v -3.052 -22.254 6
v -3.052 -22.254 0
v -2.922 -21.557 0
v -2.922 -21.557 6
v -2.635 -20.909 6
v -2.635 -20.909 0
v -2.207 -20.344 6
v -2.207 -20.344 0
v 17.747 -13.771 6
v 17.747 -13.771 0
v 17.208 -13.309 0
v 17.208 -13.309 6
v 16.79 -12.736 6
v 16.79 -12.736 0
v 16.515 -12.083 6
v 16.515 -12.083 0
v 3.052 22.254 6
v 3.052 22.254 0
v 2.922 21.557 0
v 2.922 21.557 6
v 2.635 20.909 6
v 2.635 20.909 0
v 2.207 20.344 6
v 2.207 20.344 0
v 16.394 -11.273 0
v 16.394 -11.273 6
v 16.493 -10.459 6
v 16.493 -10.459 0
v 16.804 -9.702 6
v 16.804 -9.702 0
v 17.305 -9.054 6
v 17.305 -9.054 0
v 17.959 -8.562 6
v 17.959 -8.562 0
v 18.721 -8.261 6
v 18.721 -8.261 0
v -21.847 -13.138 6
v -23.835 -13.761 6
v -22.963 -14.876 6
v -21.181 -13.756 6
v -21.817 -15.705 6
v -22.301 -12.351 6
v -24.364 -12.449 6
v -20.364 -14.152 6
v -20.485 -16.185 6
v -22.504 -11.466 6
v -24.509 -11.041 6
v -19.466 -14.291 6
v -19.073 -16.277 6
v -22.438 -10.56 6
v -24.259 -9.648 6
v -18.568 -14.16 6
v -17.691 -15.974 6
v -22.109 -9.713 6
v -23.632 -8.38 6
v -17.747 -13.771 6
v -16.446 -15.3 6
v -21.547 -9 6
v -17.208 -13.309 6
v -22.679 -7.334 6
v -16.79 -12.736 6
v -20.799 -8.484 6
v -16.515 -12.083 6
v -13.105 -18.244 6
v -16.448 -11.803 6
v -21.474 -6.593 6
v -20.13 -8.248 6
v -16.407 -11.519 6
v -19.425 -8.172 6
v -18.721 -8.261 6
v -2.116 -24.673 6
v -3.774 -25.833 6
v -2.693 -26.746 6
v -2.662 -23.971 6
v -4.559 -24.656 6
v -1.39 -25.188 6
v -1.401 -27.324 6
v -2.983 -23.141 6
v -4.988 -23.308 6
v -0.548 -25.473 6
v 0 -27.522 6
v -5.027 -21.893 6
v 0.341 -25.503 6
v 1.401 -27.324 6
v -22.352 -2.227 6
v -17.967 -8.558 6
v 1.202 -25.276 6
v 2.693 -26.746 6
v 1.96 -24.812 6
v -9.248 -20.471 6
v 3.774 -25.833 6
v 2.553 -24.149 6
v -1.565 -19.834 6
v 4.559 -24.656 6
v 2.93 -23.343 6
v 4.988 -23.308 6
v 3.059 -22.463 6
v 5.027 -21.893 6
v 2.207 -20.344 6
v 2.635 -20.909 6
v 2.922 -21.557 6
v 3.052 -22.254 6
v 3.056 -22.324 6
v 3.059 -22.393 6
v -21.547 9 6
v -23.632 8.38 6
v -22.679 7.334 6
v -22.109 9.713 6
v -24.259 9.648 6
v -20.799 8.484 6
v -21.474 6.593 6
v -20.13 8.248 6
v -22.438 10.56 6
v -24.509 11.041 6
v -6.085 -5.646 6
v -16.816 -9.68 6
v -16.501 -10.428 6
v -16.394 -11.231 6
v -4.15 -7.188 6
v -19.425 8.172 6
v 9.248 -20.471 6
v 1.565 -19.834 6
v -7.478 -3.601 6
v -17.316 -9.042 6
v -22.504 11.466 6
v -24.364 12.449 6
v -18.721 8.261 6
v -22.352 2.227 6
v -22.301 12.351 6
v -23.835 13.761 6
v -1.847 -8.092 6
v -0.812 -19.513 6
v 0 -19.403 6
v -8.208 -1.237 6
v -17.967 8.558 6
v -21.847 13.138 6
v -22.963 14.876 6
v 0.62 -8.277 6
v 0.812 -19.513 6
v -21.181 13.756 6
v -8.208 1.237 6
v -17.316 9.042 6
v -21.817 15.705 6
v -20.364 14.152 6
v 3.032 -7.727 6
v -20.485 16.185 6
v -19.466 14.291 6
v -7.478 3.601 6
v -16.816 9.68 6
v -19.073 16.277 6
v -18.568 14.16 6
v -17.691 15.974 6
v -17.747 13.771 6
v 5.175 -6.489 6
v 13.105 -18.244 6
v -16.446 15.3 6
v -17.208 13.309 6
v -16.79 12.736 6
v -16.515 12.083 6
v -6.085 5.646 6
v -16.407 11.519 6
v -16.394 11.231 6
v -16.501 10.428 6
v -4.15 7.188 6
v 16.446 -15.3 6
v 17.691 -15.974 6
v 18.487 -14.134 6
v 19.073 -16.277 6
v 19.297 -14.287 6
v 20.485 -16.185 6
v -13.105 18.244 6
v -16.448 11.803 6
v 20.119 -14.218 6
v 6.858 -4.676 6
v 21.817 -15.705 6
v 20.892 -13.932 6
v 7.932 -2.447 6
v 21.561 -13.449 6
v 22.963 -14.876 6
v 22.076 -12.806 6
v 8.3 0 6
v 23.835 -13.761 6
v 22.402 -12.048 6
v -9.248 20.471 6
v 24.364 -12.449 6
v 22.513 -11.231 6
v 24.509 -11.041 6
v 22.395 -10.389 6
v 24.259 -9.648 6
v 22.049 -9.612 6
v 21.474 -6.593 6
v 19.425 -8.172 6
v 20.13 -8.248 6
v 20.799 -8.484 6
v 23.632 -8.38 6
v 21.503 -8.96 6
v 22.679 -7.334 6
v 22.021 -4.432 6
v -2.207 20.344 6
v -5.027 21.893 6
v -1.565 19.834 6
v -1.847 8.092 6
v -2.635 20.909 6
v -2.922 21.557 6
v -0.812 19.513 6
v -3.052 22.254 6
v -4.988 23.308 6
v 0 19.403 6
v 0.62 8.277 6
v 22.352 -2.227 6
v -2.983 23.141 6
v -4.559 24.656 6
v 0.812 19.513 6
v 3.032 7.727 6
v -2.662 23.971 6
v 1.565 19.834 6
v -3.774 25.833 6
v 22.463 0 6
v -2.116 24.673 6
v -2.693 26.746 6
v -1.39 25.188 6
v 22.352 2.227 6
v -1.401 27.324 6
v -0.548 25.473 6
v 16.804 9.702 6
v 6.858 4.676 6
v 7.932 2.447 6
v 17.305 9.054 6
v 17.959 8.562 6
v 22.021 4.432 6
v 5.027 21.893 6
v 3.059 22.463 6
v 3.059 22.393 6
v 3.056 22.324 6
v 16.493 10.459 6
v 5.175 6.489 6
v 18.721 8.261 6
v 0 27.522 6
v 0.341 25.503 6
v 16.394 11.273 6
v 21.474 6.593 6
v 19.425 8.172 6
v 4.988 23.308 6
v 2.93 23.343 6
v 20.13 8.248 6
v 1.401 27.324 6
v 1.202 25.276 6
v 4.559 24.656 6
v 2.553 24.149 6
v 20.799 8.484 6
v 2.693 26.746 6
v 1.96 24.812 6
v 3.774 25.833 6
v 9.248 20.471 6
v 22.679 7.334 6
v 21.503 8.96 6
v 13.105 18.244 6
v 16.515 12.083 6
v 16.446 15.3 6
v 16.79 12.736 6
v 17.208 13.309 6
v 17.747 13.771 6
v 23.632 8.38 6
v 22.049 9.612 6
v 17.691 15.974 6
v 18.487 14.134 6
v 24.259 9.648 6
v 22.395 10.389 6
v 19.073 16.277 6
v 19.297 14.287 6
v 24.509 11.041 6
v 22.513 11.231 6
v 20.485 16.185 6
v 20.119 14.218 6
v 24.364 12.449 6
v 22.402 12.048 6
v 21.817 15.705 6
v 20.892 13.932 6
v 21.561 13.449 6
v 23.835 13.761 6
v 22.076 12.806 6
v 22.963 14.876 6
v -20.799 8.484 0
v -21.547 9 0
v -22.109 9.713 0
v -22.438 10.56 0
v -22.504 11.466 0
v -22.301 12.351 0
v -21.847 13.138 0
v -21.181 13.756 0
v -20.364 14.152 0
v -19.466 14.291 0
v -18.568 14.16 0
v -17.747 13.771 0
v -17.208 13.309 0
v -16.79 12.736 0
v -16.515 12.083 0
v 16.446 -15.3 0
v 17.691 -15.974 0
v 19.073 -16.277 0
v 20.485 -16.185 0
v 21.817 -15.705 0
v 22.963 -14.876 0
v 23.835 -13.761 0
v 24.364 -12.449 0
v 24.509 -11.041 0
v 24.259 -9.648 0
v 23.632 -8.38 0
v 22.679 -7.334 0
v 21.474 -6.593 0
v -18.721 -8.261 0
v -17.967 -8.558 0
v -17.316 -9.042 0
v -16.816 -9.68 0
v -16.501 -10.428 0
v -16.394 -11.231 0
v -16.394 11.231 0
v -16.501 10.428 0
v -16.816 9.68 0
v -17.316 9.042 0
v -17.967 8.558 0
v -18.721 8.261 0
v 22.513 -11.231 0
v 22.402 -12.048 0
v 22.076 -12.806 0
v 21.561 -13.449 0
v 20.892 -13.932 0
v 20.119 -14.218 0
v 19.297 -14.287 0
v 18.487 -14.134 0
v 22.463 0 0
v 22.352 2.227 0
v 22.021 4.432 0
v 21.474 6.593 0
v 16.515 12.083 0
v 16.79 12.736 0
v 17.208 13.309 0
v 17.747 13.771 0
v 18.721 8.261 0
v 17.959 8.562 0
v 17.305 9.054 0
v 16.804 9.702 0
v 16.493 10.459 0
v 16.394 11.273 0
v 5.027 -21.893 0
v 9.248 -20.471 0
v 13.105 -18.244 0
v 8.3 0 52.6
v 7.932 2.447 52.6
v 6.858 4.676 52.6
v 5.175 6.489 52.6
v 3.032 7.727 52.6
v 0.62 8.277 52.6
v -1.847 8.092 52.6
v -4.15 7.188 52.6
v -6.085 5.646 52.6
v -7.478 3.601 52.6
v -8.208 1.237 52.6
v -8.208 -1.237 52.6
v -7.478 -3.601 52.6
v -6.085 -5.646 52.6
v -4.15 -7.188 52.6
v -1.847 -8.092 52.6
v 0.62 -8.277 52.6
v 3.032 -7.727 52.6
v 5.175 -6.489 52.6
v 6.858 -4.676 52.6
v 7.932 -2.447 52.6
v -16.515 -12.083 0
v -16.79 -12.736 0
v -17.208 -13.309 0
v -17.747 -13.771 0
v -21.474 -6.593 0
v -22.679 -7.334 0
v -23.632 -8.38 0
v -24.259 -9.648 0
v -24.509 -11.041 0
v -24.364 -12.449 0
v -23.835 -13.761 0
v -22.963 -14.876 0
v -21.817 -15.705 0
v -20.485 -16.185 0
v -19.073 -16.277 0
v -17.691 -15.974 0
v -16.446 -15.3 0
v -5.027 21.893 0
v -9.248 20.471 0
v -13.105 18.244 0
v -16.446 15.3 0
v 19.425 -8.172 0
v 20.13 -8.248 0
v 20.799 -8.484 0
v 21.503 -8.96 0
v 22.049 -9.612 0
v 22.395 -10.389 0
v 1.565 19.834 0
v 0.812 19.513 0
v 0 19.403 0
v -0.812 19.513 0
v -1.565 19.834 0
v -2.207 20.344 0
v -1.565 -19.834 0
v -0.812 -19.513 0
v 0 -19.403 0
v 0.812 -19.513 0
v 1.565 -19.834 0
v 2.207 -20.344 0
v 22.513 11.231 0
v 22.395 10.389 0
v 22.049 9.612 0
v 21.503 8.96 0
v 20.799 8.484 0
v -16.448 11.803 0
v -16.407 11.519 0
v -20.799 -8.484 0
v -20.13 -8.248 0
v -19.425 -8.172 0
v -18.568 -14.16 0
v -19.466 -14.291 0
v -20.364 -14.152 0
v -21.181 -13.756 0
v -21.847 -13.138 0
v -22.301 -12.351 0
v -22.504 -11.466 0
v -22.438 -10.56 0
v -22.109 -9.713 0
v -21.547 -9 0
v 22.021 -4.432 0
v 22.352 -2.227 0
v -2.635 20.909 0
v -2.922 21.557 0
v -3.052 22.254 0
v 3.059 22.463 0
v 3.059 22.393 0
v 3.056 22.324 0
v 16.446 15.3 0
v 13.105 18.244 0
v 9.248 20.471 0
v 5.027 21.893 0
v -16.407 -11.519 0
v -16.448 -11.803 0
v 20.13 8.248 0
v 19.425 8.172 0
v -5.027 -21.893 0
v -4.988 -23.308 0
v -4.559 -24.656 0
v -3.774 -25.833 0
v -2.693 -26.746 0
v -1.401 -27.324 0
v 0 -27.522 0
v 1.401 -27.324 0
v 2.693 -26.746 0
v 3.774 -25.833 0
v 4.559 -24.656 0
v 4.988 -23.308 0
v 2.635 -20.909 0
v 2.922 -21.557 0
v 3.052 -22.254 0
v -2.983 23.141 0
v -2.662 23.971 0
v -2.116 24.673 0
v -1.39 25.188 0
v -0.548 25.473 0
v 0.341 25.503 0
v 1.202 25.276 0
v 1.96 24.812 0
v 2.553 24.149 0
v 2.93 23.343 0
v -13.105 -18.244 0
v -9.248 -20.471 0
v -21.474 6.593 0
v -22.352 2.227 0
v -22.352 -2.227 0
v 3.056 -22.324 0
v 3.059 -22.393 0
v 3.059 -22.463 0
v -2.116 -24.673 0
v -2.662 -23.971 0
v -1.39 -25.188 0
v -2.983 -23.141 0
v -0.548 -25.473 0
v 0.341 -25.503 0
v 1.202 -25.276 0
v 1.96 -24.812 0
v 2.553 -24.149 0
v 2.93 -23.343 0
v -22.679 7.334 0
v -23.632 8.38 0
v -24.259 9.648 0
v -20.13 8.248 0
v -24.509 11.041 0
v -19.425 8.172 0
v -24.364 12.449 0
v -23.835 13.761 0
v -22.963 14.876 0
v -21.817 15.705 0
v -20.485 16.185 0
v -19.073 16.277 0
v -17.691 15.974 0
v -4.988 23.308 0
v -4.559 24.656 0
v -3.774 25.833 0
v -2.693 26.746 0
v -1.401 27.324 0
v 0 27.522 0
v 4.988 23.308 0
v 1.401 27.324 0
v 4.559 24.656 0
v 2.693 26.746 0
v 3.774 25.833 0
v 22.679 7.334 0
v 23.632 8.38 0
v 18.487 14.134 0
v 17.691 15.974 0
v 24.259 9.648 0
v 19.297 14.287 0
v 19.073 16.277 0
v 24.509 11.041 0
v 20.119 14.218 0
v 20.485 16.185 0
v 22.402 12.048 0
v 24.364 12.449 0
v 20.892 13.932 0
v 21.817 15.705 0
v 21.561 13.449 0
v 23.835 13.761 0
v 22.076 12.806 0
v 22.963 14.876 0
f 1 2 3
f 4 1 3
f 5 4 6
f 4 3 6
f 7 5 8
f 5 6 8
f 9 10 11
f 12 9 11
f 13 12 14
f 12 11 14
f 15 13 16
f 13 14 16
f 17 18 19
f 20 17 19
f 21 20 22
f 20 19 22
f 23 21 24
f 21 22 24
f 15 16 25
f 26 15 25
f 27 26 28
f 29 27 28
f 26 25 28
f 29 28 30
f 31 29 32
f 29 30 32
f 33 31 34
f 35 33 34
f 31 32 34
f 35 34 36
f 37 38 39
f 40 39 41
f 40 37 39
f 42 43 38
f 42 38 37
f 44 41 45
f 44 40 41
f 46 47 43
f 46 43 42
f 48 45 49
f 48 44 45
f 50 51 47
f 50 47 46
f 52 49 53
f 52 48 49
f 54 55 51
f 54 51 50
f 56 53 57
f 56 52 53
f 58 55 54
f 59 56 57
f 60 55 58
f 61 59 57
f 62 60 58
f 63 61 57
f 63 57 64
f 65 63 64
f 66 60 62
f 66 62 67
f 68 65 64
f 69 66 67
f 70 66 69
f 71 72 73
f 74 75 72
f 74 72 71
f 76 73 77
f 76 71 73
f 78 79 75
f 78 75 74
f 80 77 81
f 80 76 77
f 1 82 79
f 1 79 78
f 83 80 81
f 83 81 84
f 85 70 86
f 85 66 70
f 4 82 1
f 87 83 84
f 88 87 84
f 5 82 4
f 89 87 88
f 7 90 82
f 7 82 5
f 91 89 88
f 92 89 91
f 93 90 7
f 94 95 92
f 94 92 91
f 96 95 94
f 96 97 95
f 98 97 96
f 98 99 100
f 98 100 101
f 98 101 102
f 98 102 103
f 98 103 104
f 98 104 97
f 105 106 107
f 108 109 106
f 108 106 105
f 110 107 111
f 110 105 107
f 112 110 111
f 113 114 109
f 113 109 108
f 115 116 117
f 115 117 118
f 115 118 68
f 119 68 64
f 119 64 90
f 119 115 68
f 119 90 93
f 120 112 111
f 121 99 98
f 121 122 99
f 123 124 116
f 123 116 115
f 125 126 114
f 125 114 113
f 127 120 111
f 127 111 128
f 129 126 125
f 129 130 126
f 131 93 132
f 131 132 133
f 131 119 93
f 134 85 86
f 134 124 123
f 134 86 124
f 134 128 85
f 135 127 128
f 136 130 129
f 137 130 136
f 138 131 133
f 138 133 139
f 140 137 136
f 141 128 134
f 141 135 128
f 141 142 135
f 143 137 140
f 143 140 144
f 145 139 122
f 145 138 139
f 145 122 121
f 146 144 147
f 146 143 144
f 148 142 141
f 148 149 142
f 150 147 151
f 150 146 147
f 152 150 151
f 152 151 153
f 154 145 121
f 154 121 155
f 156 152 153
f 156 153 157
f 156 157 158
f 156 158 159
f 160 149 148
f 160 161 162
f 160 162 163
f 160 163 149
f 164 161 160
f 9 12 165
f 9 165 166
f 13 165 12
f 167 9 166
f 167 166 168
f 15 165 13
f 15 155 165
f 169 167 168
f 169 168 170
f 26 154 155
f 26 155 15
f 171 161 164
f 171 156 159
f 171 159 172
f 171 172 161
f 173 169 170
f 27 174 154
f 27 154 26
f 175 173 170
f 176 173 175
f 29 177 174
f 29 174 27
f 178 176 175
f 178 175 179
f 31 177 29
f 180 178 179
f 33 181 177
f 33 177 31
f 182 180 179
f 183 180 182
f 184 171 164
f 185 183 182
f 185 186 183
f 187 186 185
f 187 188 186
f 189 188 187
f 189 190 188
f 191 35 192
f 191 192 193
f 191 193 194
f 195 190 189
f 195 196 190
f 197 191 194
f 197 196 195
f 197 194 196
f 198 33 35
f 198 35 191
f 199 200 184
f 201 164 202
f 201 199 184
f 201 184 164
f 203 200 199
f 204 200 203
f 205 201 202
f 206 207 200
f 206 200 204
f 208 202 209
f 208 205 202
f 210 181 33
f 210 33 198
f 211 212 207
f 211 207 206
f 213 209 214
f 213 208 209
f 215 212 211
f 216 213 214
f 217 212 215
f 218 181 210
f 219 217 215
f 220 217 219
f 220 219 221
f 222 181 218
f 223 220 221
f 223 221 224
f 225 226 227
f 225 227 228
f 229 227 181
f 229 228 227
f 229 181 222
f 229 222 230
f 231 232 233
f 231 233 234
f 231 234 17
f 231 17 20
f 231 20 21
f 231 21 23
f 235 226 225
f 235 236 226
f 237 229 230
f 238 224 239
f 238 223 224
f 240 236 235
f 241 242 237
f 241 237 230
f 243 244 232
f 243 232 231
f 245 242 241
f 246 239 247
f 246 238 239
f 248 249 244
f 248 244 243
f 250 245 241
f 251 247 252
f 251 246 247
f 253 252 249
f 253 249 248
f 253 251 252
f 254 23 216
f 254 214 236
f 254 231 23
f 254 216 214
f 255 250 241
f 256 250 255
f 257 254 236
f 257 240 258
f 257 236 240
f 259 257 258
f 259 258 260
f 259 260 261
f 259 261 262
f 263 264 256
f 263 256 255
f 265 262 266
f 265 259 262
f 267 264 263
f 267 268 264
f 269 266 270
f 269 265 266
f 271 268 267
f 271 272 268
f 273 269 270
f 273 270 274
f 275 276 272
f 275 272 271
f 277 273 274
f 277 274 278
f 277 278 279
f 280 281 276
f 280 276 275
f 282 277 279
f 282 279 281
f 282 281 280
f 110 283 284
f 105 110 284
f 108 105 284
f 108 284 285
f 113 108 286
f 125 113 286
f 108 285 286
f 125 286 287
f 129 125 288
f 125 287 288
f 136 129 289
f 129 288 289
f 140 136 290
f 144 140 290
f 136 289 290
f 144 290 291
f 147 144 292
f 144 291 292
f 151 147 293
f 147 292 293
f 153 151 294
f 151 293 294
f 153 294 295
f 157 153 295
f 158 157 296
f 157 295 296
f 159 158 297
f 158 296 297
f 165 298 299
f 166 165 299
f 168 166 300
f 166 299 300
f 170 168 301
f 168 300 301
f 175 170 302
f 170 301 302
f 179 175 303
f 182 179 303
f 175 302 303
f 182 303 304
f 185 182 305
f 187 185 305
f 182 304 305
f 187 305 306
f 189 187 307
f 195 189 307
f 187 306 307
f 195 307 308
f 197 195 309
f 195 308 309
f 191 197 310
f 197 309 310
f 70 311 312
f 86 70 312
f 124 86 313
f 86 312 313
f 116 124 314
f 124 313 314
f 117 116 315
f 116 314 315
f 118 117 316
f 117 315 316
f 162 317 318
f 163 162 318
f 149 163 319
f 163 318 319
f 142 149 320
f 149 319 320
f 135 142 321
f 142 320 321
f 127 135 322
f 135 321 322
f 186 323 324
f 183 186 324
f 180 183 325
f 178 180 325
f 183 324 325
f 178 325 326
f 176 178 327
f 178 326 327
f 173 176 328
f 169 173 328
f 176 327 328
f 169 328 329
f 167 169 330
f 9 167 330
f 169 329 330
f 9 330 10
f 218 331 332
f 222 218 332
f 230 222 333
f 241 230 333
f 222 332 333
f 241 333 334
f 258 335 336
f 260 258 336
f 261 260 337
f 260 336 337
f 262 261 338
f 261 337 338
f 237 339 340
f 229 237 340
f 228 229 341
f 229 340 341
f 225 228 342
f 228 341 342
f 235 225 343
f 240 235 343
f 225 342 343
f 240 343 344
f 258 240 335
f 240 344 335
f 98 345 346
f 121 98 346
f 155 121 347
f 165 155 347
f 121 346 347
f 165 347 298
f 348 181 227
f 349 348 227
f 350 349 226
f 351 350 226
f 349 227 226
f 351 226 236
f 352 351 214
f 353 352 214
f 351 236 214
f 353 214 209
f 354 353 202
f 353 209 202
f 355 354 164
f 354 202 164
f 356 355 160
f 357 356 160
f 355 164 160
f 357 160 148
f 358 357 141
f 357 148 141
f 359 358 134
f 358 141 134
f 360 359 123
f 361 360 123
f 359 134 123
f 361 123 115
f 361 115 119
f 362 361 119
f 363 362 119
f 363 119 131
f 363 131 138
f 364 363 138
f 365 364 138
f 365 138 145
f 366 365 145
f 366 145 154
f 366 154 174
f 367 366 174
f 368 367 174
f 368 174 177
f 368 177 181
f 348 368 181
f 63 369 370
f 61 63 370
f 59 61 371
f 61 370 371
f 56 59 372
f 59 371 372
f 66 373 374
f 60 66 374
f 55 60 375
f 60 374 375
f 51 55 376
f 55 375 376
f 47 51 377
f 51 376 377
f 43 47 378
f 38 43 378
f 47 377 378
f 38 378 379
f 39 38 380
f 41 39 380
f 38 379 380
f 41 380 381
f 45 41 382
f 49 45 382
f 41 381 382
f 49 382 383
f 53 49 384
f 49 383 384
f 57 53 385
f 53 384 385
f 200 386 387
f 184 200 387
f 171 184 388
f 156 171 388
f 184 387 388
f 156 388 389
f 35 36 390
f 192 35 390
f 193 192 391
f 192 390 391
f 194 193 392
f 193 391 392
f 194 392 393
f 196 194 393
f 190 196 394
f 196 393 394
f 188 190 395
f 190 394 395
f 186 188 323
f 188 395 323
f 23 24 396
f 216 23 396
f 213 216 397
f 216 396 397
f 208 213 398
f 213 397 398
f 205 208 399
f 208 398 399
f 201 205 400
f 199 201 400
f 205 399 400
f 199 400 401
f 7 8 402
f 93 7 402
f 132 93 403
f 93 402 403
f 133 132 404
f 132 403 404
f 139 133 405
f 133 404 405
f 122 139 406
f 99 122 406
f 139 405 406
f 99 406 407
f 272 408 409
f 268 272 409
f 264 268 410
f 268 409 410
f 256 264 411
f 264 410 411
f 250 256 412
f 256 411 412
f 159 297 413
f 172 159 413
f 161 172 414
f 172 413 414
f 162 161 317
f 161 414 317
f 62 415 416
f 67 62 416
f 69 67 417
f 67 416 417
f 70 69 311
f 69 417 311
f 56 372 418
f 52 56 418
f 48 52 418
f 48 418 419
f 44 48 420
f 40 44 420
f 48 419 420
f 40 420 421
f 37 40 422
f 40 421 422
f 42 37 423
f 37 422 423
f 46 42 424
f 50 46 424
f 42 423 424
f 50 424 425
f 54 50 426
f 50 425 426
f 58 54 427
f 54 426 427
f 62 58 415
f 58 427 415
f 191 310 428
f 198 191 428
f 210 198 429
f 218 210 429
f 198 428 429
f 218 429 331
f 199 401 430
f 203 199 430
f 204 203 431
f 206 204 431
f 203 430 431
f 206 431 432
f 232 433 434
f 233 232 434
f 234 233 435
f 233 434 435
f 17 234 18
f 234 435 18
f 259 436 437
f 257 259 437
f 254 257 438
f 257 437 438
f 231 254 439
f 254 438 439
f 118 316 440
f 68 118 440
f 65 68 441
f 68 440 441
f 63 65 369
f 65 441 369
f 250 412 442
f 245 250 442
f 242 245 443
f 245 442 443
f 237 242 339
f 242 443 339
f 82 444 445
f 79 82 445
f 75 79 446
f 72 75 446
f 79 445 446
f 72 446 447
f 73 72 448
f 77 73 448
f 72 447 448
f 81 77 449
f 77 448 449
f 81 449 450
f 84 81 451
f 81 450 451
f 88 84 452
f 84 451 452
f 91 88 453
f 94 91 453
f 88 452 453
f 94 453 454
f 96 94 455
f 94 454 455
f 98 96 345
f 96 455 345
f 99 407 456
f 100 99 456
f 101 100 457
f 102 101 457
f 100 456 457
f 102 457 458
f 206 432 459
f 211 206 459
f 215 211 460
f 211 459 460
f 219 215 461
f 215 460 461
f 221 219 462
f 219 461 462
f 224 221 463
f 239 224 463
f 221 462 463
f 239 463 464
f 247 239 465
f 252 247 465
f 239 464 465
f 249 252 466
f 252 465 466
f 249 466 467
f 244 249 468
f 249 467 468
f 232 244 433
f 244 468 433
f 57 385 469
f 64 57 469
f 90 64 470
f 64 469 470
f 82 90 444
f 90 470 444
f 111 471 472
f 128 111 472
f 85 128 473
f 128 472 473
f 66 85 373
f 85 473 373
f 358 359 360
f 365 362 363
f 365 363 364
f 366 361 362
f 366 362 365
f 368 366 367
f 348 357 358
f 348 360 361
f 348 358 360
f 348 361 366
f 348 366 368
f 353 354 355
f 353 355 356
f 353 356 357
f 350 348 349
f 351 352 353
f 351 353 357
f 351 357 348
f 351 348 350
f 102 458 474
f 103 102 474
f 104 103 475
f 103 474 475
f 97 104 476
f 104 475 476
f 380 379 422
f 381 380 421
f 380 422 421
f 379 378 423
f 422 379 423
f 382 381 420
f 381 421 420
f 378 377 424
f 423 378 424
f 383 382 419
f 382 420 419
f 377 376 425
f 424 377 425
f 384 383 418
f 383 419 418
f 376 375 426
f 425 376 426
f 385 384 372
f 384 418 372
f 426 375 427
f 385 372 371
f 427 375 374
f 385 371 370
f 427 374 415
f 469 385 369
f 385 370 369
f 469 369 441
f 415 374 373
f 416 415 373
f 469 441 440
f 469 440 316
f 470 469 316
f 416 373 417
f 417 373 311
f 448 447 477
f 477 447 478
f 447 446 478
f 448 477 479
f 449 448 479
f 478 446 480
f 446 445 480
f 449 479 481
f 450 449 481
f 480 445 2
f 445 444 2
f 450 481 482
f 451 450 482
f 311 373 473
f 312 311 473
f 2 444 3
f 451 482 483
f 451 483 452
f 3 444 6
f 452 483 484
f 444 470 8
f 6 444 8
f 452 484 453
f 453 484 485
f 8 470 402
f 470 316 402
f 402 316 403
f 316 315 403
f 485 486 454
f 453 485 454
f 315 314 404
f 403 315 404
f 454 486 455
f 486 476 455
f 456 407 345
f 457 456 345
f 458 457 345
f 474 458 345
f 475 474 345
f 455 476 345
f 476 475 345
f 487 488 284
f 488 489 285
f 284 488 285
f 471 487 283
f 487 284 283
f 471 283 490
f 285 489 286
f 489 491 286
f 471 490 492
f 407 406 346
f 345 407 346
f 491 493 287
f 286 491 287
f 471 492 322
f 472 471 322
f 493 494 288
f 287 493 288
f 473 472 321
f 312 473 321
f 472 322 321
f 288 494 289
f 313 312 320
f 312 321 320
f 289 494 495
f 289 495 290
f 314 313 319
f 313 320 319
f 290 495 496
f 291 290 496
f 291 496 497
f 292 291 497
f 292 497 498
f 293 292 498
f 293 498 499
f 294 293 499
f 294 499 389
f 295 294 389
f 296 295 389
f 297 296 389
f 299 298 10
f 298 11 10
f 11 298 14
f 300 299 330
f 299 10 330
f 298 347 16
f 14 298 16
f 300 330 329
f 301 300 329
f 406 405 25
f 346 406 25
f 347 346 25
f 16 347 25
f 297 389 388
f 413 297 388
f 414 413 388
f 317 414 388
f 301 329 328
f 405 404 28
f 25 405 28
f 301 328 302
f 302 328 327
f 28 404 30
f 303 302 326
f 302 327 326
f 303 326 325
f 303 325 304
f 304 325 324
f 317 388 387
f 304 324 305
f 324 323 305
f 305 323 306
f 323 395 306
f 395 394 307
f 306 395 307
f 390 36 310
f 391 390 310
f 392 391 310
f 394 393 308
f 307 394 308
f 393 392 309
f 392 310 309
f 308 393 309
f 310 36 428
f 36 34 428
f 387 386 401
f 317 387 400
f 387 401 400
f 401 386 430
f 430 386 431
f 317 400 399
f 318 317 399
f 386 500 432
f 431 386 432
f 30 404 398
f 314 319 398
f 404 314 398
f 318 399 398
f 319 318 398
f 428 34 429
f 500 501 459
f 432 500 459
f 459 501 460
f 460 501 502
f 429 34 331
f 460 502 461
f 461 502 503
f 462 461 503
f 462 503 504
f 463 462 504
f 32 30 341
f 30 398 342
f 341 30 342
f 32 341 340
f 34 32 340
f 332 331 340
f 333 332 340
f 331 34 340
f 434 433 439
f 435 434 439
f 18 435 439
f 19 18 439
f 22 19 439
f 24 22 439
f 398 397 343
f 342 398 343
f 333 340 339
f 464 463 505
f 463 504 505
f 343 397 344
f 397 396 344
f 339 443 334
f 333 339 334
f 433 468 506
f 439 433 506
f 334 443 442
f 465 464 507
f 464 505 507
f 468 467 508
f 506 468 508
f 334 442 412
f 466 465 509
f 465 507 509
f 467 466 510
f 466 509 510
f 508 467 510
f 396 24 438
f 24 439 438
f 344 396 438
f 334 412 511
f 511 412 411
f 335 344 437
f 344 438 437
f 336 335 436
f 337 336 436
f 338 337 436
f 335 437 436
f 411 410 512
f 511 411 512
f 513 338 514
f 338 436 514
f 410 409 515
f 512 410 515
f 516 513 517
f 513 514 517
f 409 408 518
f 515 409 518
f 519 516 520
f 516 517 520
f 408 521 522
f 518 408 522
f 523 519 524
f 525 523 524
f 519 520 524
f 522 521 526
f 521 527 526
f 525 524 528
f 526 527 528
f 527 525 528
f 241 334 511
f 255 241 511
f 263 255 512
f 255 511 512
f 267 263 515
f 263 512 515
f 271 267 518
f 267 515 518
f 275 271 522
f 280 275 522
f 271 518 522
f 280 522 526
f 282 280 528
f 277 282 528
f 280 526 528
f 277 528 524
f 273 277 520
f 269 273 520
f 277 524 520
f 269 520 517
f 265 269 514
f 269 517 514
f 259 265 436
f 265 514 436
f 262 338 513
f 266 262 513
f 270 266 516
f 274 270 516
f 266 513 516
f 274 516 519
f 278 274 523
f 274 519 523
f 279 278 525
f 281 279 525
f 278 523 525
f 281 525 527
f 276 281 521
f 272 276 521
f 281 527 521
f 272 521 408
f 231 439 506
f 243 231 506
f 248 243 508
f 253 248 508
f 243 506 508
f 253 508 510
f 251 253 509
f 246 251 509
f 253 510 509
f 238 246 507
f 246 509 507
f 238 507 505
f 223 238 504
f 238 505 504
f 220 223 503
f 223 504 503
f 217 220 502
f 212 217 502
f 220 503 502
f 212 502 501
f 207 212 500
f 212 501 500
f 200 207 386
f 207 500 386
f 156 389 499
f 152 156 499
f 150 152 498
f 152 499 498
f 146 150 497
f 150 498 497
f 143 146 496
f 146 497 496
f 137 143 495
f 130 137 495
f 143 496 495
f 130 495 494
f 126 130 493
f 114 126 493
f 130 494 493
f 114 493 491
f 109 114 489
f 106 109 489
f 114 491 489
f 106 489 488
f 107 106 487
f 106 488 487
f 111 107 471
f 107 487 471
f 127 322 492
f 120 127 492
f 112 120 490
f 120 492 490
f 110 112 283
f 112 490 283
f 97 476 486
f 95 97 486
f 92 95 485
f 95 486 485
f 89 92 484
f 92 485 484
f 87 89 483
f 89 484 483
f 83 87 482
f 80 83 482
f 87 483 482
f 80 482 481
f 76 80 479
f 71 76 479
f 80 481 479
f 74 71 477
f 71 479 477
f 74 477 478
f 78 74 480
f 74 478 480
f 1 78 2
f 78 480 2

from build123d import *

# Parameters (mm, degrees)
F0_R     = 8.300329
F1_DEPTH = 52.6
F2_DEPTH = 6


with BuildPart() as f1:
    # F0 (on Top) → F1 (new body)
    with BuildSketch(Plane.XY):
        Circle(F0_R)
    extrude(amount=F1_DEPTH)

    # F0 (on Top) → F2 (join)
    with BuildSketch(Plane.XY):
        with BuildLine():
            ThreePointArc((17.74679, 13.770643), (17.113653, 14.549985), (16.44632, 15.300253))
            ThreePointArc((16.44632, 15.300253), (11.23142, 19.45339), (5.027248, 21.893057))
            ThreePointArc((5.027248, 21.893057), (4.04383, 22.095851), (3.052332, 22.254493))
            ThreePointArc((3.052332, 22.254493), (2.797639, 21.224553), (2.206503, 20.343529))
            ThreePointArc((2.206503, 20.343529), (10.23142, 17.721339), (16.514761, 12.082652))
            ThreePointArc((16.514761, 12.082652), (16.982183, 13.035103), (17.74679, 13.770643))
        make_face()
        with BuildLine():
            ThreePointArc((3.052332, 22.254493), (4.04383, 22.095851), (5.027248, 21.893057))
            ThreePointArc((5.027248, 21.893057), (0, 27.522274), (-5.027248, 21.893057))
            ThreePointArc((-5.027248, 21.893057), (-4.04383, 22.095851), (-3.052332, 22.254493))
            ThreePointArc((-3.052332, 22.254493), (-0.104234, 25.520498), (3.059434, 22.46284))
            ThreePointArc((3.059434, 22.46284), (3.057658, 22.358606), (3.052332, 22.254493))
        make_face()
        with BuildLine():
            ThreePointArc((20.799122, 8.48385), (21.157483, 7.545866), (21.473568, 6.592804))
            ThreePointArc((21.473568, 6.592804), (23.834989, 13.761137), (16.44632, 15.300253))
            ThreePointArc((16.44632, 15.300253), (17.113653, 14.549985), (17.74679, 13.770643))
            ThreePointArc((17.74679, 13.770643), (20.89195, 13.931547), (22.512824, 11.23142))
            ThreePointArc((22.512824, 11.23142), (22.049283, 9.612322), (20.799122, 8.48385))
        make_face()
        with BuildLine():
            ThreePointArc((21.473568, -6.592804), (22.214145, -3.333306), (22.46284, 0))
            ThreePointArc((22.46284, 0), (22.214145, 3.333306), (21.473568, 6.592804))
            ThreePointArc((21.473568, 6.592804), (21.157483, 7.545866), (20.799122, 8.48385))
            ThreePointArc((20.799122, 8.48385), (19.779822, 8.18945), (18.721265, 8.260876))
            ThreePointArc((18.721265, 8.260876), (20.022713, 4.221231), (20.46284, 0))
            ThreePointArc((20.46284, 0), (20.022713, -4.221231), (18.721265, -8.260876))
            ThreePointArc((18.721265, -8.260876), (19.779822, -8.18945), (20.799122, -8.48385))
            ThreePointArc((20.799122, -8.48385), (21.157483, -7.545866), (21.473568, -6.592804))
        make_face()
        with BuildLine():
            ThreePointArc((5.027248, -21.893057), (11.23142, -19.45339), (16.44632, -15.300253))
            ThreePointArc((16.44632, -15.300253), (17.113653, -14.549985), (17.74679, -13.770643))
            ThreePointArc((17.74679, -13.770643), (16.982183, -13.035103), (16.514761, -12.082652))
            ThreePointArc((16.514761, -12.082652), (10.23142, -17.721339), (2.206503, -20.343529))
            ThreePointArc((2.206503, -20.343529), (2.797639, -21.224553), (3.052332, -22.254493))
            ThreePointArc((3.052332, -22.254493), (4.04383, -22.095851), (5.027248, -21.893057))
        make_face()
        with BuildLine():
            ThreePointArc((16.44632, -15.300253), (23.834989, -13.761137), (21.473568, -6.592804))
            ThreePointArc((21.473568, -6.592804), (21.157483, -7.545866), (20.799122, -8.48385))
            ThreePointArc((20.799122, -8.48385), (22.049283, -9.612322), (22.512824, -11.23142))
            ThreePointArc((22.512824, -11.23142), (20.89195, -13.931547), (17.74679, -13.770643))
            ThreePointArc((17.74679, -13.770643), (17.113653, -14.549985), (16.44632, -15.300253))
        make_face()
        with BuildLine():
            ThreePointArc((-5.027248, -21.893057), (0, -27.522274), (5.027248, -21.893057))
            ThreePointArc((5.027248, -21.893057), (4.04383, -22.095851), (3.052332, -22.254493))
            ThreePointArc((3.052332, -22.254493), (3.057658, -22.358606), (3.059434, -22.46284))
            ThreePointArc((3.059434, -22.46284), (-0.104234, -25.520498), (-3.052332, -22.254493))
            ThreePointArc((-3.052332, -22.254493), (-4.04383, -22.095851), (-5.027248, -21.893057))
        make_face()
        with BuildLine():
            ThreePointArc((-16.44632, -15.300253), (-11.23142, -19.45339), (-5.027248, -21.893057))
            ThreePointArc((-5.027248, -21.893057), (-4.04383, -22.095851), (-3.052332, -22.254493))
            ThreePointArc((-3.052332, -22.254493), (-2.797639, -21.224553), (-2.206503, -20.343529))
            ThreePointArc((-2.206503, -20.343529), (-10.23142, -17.721339), (-16.514761, -12.082652))
            ThreePointArc((-16.514761, -12.082652), (-16.982183, -13.035103), (-17.74679, -13.770643))
            ThreePointArc((-17.74679, -13.770643), (-17.113653, -14.549985), (-16.44632, -15.300253))
        make_face()
        with BuildLine():
            ThreePointArc((-20.799122, 8.48385), (-21.157483, 7.545866), (-21.473568, 6.592804))
            ThreePointArc((-21.473568, 6.592804), (-22.46284, 0), (-21.473568, -6.592804))
            ThreePointArc((-21.473568, -6.592804), (-21.157483, -7.545866), (-20.799122, -8.48385))
            ThreePointArc((-20.799122, -8.48385), (-19.779822, -8.18945), (-18.721265, -8.260876))
            ThreePointArc((-18.721265, -8.260876), (-20.46284, 0), (-18.721265, 8.260876))
            ThreePointArc((-18.721265, 8.260876), (-19.779822, 8.18945), (-20.799122, 8.48385))
        make_face()
        with BuildLine():
            ThreePointArc((-3.052332, 22.254493), (-4.04383, 22.095851), (-5.027248, 21.893057))
            ThreePointArc((-5.027248, 21.893057), (-11.23142, 19.45339), (-16.44632, 15.300253))
            ThreePointArc((-16.44632, 15.300253), (-17.113653, 14.549985), (-17.74679, 13.770643))
            ThreePointArc((-17.74679, 13.770643), (-16.982183, 13.035103), (-16.514761, 12.082652))
            ThreePointArc((-16.514761, 12.082652), (-10.23142, 17.721339), (-2.206503, 20.343529))
            ThreePointArc((-2.206503, 20.343529), (-2.797639, 21.224553), (-3.052332, 22.254493))
        make_face()
        with BuildLine():
            ThreePointArc((-17.74679, 13.770643), (-17.113653, 14.549985), (-16.44632, 15.300253))
            ThreePointArc((-16.44632, 15.300253), (-23.834989, 13.761137), (-21.473568, 6.592804))
            ThreePointArc((-21.473568, 6.592804), (-21.157483, 7.545866), (-20.799122, 8.48385))
            ThreePointArc((-20.799122, 8.48385), (-22.102938, 12.761137), (-17.74679, 13.770643))
        make_face()
        with BuildLine():
            ThreePointArc((-21.473568, -6.592804), (-23.834989, -13.761137), (-16.44632, -15.300253))
            ThreePointArc((-16.44632, -15.300253), (-17.113653, -14.549985), (-17.74679, -13.770643))
            ThreePointArc((-17.74679, -13.770643), (-22.102938, -12.761137), (-20.799122, -8.48385))
            ThreePointArc((-20.799122, -8.48385), (-21.157483, -7.545866), (-21.473568, -6.592804))
        make_face()
        with BuildLine():
            ThreePointArc((20.46284, 0), (20.022713, 4.221231), (18.721265, 8.260876))
            ThreePointArc((18.721265, 8.260876), (16.803842, 9.701703), (16.514761, 12.082652))
            ThreePointArc((16.514761, 12.082652), (10.23142, 17.721339), (2.206503, 20.343529))
            ThreePointArc((2.206503, 20.343529), (0, 19.403406), (-2.206503, 20.343529))
            ThreePointArc((-2.206503, 20.343529), (-10.23142, 17.721339), (-16.514761, 12.082652))
            ThreePointArc((-16.514761, 12.082652), (-16.424308, 11.661301), (-16.393956, 11.23142))
            ThreePointArc((-16.393956, 11.23142), (-17.045068, 9.344591), (-18.721265, 8.260876))
            ThreePointArc((-18.721265, 8.260876), (-20.46284, 0), (-18.721265, -8.260876))
            ThreePointArc((-18.721265, -8.260876), (-17.045068, -9.344591), (-16.393956, -11.23142))
            ThreePointArc((-16.393956, -11.23142), (-16.424308, -11.661301), (-16.514761, -12.082652))
            ThreePointArc((-16.514761, -12.082652), (-10.23142, -17.721339), (-2.206503, -20.343529))
            ThreePointArc((-2.206503, -20.343529), (0, -19.403406), (2.206503, -20.343529))
            ThreePointArc((2.206503, -20.343529), (10.23142, -17.721339), (16.514761, -12.082652))
            ThreePointArc((16.514761, -12.082652), (16.803842, -9.701703), (18.721265, -8.260876))
            ThreePointArc((18.721265, -8.260876), (20.022713, -4.221231), (20.46284, 0))
        make_face()
        Circle(F0_R, mode=Mode.SUBTRACT)
    extrude(amount=F2_DEPTH)


solid = f1.part
